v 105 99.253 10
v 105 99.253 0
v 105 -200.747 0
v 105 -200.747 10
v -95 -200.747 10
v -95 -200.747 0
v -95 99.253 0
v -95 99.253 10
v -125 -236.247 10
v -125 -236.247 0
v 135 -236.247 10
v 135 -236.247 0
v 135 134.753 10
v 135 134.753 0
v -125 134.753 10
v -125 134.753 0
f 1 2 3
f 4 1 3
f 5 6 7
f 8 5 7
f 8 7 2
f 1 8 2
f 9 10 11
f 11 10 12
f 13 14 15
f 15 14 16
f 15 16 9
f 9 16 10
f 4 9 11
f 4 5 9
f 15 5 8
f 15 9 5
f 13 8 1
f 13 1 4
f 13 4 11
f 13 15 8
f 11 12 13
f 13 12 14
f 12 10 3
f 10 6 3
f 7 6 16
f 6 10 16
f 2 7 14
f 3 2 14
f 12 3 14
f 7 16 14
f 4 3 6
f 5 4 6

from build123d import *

# Parameters (mm, degrees)
F1_DEPTH = 10


with BuildPart() as f1:
    # F0 (on Top) → F1 (new body)
    with BuildSketch(Plane.XY):
        Polygon((-125, -111.86579), (-125, -236.247406), (5.863019, -236.247406), (5.863019, -200.747406), (-95, -200.747406), (-95, -111.86579), align=None)
        Polygon((5.863019, -200.747406), (5.863019, -236.247406), (135, -236.247406), (135, -50.747406), (105, -50.747406), (105, -200.747406), align=None)
        Polygon((-125, 134.752594), (-125, -111.86579), (-95, -111.86579), (-95, 99.252594), (15.707426, 99.252594), (15.707426, 134.752594), align=None)
        Polygon((105, -50.747406), (135, -50.747406), (135, 134.752594), (15.707426, 134.752594), (15.707426, 99.252594), (105, 99.252594), align=None)
    extrude(amount=F1_DEPTH)


solid = f1.part
